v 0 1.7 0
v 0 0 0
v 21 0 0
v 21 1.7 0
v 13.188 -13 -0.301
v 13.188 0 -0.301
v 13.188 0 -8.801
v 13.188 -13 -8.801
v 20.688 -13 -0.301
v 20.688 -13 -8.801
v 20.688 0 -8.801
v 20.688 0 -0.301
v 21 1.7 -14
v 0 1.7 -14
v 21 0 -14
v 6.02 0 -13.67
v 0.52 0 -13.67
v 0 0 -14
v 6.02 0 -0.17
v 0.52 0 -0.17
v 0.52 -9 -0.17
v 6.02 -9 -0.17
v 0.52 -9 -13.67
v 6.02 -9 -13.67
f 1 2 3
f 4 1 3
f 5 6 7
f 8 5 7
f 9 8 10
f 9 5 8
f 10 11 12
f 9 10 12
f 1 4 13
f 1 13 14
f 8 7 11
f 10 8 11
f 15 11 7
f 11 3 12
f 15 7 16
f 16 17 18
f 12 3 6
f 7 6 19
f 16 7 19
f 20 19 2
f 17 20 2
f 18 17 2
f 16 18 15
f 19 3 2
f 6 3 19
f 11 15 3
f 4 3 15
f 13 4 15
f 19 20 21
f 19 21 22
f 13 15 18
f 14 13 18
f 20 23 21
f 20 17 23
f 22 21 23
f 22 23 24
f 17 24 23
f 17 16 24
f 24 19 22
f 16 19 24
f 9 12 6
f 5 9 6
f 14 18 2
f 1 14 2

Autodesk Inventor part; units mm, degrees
ref_plane "YZ Plane" through (0, 0, 0) normal (1, 0, 0) x (0, 1, 0)
ref_plane "XZ Plane" through (0, 0, 0) normal (0, 1, 0) x (-1, 0, 0)
ref_plane "XY Plane" through (0, 0, 0) normal (0, 0, 1) x (1, 0, 0)
sketch "Sketch1" plane through (0, 0, 0) normal (0, 1, 0) x (-1, 0, 0)
  line L0 (0, 0) -> (-21, 0)
  line L1 (-21, 0) -> (-21, -14)
  line L2 (-21, -14) -> (0, -14)
  line L3 (0, -14) -> (0, 0)
  dimension "d0" = 21
  dimension "d1" = 14
extrude "Extrusion1" add sketch "Sketch1" along normal blind 1.7
sketch "Sketch2" plane through (0, 0, 0) normal (0, -1, 0) x (1, 0, 0)
  line L0 (0, 0) -> (21, 0) projected
  line L1 (0, -14) -> (0, 0) projected
  line L2 (-4.6, 0) -> (27.6, 0) projected
  line L3 (0, -16.8) -> (0, 2.8) projected
  line L4 (0.52, -0.17) -> (6.02, -0.17)
  line L5 (6.02, -0.17) -> (6.02, -13.67)
  line L6 (6.02, -13.67) -> (0.52, -13.67)
  line L7 (0.52, -13.67) -> (0.52, -0.17)
  line L8 (2, -1.84) -> (2, -0.17)
  line L9 (2, -1.84) -> (0.52, -1.84)
  line L10 (4.54, -12) -> (4.54, -13.67)
  line L11 (4.54, -12) -> (6.02, -12)
  point P0 (4.54, -1.84)
  point P1 (2, -4.38)
  point P2 (4.54, -4.38)
  point P3 (2, -6.92)
  point P4 (4.54, -6.92)
  point P5 (2, -9.46)
  point P6 (4.54, -9.46)
  point P7 (2, -12)
  dimension "d12" = 2.54
  dimension "d15" = 2.54
  dimension "d18" = 5.5
  dimension "d19" = 13.5
  dimension "d20" = 4.38
  dimension "d21" = 4.54
extrude "Extrusion2" add sketch "Sketch2" along normal blind 9
sketch "Sketch3" plane through (0, 0, 0) normal (0, -1, 0) x (1, 0, 0)
  line L0 (0, -14) -> (0, 0) projected
  line L1 (13.1877, -8.8011) -> (20.6877, -8.8011)
  line L2 (20.6877, -8.8011) -> (20.6877, -0.3011)
  line L3 (20.6877, -0.3011) -> (13.1877, -0.3011)
  line L4 (13.1877, -0.3011) -> (13.1877, -8.8011)
  line L5 (19.1, -2.8011) -> (19.1, -0.3011)
  line L6 (19.1, -6.3011) -> (19.1, -8.8011)
  dimension "d25" = 19.1
  dimension "d26" = 3.5
  dimension "d27" = 7.5
  dimension "d28" = 8.5
extrude "Extrusion3" add sketch "Sketch3" along normal blind 13
properties part number "ccpad"
